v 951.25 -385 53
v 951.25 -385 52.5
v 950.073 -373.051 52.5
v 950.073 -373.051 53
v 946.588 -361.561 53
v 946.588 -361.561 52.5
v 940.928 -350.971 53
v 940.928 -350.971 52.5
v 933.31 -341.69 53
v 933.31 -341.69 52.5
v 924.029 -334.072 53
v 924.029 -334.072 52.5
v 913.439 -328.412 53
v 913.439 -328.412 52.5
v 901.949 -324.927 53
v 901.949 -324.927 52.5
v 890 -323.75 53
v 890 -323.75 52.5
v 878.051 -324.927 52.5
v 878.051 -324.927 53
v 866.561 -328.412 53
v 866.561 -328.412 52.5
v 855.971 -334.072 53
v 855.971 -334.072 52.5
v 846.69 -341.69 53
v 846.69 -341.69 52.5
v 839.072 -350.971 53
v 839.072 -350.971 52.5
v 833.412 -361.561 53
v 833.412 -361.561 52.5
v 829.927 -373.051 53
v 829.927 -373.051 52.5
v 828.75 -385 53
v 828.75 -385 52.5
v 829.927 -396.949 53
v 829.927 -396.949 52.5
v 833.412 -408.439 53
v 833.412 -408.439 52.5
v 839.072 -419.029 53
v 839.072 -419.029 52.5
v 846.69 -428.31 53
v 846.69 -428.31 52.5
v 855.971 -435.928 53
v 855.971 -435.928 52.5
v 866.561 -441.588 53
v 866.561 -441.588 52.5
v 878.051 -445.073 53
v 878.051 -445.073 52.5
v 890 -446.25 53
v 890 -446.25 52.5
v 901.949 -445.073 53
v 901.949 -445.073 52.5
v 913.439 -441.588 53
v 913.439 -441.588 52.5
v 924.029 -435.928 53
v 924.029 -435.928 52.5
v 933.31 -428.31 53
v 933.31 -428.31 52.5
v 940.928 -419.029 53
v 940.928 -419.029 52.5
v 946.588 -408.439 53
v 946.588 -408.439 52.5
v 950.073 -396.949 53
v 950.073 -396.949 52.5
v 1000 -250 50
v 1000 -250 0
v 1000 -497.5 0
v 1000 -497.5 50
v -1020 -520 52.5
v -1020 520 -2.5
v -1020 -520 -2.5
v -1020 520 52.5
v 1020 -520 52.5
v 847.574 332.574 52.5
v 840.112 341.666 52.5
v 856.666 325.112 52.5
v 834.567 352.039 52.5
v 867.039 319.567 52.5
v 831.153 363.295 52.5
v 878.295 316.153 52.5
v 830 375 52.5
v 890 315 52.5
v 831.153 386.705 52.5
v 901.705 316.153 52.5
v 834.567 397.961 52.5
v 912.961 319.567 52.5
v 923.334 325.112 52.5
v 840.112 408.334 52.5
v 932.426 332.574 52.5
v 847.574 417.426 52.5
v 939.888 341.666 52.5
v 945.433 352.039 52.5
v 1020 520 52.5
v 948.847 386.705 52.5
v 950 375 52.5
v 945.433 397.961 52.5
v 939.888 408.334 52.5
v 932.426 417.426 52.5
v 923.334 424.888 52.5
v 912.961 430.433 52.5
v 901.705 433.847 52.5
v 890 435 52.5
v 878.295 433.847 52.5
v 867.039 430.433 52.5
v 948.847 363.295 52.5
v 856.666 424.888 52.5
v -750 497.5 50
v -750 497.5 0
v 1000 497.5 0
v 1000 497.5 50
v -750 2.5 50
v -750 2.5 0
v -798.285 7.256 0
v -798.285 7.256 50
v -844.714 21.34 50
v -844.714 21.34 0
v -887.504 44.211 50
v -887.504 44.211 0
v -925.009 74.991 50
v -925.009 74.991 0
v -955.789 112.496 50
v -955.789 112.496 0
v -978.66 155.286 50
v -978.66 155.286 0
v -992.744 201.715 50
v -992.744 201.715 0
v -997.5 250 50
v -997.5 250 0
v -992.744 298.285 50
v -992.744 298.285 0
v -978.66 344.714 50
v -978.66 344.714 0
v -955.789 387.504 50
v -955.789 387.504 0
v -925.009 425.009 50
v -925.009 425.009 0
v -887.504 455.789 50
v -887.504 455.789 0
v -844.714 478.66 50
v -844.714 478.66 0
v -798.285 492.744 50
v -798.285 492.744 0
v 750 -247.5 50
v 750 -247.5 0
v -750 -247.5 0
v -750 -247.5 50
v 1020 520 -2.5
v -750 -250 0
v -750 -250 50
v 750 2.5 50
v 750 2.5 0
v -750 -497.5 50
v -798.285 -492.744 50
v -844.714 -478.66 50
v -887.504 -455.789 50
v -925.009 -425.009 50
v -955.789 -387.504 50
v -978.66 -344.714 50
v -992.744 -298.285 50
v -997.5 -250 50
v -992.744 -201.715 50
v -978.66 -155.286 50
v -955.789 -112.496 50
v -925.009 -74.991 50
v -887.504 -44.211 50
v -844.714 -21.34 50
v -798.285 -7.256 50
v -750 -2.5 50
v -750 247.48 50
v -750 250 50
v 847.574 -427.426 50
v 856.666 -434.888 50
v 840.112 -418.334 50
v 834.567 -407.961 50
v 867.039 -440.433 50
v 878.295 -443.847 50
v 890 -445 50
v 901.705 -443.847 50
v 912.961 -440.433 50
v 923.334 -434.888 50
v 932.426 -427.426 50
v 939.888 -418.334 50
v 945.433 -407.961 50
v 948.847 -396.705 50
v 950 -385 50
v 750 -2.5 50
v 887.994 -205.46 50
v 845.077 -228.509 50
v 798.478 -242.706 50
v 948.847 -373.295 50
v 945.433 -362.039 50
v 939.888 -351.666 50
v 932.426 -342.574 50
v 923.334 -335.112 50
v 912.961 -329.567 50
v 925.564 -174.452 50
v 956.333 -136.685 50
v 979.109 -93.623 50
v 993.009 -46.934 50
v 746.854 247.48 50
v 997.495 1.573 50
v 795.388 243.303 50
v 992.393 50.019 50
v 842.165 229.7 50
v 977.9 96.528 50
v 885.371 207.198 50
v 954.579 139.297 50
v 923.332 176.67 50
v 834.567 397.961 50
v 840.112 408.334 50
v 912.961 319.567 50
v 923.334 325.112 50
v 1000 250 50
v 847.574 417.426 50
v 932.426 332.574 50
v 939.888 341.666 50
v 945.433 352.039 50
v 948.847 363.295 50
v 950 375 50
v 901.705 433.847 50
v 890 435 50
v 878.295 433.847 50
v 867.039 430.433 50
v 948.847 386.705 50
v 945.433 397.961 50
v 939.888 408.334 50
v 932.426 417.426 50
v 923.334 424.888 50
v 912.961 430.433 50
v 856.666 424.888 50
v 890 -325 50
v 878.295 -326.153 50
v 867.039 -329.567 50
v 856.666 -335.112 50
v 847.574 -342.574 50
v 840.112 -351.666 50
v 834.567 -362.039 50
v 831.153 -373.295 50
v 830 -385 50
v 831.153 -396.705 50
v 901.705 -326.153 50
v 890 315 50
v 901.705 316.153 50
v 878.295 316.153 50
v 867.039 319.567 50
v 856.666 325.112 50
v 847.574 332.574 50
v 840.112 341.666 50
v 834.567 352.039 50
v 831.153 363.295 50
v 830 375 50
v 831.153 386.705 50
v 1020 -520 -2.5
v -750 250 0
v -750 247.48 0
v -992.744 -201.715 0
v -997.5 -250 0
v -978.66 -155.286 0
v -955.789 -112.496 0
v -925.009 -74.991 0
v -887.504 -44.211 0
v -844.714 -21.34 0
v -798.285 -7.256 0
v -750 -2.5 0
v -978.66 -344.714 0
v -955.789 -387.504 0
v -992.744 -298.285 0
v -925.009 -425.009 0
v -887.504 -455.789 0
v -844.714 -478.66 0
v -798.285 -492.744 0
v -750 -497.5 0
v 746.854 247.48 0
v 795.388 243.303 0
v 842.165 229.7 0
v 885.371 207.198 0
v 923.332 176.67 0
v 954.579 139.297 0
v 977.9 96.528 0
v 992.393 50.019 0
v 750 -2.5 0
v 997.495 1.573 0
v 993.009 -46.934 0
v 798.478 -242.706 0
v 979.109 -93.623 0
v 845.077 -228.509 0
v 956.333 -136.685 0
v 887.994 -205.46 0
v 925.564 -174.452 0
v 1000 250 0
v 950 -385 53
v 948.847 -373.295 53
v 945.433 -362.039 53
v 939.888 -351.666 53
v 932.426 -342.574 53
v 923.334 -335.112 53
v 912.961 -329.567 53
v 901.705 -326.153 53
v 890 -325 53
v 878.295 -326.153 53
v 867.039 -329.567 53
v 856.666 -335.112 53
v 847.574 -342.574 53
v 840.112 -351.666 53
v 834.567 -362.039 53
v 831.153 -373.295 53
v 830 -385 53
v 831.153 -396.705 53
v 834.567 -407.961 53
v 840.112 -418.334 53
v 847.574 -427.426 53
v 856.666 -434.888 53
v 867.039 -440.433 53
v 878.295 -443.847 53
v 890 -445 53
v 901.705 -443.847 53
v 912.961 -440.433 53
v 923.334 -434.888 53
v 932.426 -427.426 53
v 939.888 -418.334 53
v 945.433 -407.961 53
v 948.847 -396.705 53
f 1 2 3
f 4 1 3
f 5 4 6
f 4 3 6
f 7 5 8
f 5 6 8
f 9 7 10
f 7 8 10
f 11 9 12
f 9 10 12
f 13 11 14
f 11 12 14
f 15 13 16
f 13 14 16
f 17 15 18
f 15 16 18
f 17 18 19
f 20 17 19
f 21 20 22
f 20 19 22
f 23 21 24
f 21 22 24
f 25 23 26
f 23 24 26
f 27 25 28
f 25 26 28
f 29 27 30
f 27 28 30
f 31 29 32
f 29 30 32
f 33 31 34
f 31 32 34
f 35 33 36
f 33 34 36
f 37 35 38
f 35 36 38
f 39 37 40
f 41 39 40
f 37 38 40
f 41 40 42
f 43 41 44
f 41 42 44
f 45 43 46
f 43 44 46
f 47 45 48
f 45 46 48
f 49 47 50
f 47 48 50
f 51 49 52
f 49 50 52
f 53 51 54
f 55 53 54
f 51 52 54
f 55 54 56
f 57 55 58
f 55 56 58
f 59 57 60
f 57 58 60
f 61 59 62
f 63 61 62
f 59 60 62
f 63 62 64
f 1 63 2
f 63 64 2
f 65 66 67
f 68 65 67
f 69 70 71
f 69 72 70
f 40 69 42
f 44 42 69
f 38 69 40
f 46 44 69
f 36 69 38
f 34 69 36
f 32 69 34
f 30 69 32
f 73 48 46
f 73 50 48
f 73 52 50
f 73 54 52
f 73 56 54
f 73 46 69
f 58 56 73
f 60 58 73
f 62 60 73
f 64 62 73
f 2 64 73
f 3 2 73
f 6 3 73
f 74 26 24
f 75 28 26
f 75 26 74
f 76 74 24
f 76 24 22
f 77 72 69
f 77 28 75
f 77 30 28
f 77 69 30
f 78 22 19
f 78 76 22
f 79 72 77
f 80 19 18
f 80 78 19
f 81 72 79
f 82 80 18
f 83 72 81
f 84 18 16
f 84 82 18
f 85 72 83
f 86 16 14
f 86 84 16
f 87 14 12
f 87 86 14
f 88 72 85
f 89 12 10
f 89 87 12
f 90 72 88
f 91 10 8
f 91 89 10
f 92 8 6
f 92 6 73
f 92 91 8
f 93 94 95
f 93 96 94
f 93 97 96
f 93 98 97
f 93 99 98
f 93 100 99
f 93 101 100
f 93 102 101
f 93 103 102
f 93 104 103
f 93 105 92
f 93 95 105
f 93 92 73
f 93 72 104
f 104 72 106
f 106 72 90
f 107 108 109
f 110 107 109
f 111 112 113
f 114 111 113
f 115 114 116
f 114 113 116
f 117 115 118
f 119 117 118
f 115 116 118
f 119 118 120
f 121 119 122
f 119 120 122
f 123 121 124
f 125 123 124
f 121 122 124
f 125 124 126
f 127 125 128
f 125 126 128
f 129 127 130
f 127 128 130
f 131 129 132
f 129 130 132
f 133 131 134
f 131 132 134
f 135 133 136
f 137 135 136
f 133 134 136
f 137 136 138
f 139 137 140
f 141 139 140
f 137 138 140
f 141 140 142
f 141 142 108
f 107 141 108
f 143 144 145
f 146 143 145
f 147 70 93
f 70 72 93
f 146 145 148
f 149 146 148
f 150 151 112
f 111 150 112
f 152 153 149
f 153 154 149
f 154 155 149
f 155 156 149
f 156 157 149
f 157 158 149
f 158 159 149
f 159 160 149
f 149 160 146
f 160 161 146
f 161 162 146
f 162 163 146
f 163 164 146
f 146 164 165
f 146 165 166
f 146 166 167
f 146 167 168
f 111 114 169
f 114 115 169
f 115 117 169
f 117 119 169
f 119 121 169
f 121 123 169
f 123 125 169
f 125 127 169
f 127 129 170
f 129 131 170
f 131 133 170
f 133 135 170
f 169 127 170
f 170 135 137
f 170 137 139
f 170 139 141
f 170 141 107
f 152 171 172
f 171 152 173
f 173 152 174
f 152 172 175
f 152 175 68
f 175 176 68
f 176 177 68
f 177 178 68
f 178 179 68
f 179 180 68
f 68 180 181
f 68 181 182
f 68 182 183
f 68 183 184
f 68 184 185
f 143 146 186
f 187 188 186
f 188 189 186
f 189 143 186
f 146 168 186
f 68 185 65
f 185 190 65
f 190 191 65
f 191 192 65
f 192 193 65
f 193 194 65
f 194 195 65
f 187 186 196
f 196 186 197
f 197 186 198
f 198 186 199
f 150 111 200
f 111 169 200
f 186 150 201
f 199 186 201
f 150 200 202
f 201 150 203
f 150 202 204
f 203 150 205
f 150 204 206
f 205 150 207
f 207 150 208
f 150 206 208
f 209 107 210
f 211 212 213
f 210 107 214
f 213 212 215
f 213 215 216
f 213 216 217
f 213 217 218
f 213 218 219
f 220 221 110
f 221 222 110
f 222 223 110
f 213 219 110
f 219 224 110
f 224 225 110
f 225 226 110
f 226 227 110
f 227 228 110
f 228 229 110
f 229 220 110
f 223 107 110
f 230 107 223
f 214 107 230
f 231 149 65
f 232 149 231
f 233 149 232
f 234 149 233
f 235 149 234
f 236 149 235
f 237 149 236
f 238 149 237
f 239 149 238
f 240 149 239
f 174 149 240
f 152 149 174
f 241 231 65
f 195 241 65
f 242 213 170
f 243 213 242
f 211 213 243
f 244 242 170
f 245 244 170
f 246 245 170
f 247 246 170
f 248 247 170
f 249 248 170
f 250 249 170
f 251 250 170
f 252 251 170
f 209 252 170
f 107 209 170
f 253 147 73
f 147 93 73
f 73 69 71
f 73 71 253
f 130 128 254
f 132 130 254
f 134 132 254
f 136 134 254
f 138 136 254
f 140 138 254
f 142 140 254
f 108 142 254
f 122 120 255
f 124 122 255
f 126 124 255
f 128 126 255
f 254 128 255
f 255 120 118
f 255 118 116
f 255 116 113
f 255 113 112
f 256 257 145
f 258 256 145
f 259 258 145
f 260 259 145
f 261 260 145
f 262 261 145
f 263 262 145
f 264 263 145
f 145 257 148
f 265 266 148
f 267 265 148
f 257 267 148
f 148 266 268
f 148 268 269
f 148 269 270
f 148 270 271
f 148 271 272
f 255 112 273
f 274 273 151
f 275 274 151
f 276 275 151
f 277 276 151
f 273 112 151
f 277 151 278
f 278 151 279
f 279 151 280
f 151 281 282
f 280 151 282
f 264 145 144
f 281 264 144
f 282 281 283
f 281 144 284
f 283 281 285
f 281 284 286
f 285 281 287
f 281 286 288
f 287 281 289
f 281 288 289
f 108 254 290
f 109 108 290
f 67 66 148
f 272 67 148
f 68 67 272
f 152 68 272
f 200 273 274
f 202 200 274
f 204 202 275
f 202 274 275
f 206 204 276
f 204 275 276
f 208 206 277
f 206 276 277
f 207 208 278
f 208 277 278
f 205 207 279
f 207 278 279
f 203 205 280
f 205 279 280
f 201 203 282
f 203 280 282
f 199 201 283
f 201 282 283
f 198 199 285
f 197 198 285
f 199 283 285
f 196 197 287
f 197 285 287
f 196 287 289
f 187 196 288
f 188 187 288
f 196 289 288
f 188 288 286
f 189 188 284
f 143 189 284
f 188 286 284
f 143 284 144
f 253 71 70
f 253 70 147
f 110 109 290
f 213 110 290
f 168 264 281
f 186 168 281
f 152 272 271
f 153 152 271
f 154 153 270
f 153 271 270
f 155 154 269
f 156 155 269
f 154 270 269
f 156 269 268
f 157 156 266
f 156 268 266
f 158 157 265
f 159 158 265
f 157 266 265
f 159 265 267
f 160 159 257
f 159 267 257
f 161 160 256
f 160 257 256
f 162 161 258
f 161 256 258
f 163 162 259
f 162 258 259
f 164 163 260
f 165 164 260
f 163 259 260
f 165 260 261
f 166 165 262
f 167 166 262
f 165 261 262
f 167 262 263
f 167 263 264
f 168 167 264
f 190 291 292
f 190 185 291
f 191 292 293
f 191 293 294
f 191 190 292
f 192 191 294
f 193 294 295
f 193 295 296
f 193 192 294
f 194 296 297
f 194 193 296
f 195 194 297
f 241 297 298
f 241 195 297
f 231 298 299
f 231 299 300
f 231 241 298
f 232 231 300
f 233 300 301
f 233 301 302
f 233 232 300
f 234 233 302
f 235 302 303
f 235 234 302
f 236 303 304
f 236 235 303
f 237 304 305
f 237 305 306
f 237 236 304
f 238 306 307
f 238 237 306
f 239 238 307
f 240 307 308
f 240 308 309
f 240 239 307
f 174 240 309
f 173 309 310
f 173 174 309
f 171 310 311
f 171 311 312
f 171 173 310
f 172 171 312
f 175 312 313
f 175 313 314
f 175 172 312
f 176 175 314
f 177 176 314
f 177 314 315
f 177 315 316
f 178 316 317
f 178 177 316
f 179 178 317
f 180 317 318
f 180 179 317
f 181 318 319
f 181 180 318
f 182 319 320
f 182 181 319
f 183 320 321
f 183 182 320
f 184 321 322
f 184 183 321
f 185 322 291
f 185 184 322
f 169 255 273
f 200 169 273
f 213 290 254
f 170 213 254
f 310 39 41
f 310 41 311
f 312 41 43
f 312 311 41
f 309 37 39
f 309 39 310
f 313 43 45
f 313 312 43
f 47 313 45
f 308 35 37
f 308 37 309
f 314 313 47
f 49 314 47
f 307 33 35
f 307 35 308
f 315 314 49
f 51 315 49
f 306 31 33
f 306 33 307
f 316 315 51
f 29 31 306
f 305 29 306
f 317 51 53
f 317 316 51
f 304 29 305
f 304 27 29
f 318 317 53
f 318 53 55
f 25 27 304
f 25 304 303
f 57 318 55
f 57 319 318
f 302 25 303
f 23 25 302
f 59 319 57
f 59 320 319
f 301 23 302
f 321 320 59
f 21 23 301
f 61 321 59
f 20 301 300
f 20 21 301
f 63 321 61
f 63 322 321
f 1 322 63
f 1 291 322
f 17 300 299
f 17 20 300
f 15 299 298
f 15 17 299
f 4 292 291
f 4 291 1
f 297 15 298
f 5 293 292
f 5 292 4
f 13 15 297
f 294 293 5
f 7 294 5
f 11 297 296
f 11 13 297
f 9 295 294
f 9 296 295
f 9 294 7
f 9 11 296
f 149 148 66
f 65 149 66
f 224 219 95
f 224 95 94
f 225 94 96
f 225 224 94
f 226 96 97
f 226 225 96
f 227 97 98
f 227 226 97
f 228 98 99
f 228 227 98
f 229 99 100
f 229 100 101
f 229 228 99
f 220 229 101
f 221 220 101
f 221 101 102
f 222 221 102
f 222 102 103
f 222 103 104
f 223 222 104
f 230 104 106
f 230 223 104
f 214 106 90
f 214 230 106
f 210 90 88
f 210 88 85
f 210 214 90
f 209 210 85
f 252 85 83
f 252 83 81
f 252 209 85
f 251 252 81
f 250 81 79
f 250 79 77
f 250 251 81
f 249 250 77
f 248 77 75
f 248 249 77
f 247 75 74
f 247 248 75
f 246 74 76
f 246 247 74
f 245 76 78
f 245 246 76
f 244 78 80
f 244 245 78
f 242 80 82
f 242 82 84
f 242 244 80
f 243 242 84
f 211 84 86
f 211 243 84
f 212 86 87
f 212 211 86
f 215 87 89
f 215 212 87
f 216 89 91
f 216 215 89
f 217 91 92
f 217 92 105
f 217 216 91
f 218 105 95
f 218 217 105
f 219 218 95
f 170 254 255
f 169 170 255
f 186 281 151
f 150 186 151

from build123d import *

# Parameters (mm, degrees)
F0_W     = 2040
F0_H     = 1040
F1_DEPTH = 50
F2_W     = 2040
F2_H     = 1040
F2_R     = 60
F3_DEPTH = 2.5
F4_W     = 2040
F4_H     = 1040
F5_DEPTH = 2.5
F6_R     = 61.25
F6_R_2   = 60
F7_DEPTH = 0.5


with BuildPart() as f1:
    # F0 (on Top) → F1 (new body)
    with BuildSketch(Plane.XY):
        Rectangle(F0_W, F0_H)
        Polygon((-1000, 250), (-1000, 500), (-750, 500), (1000, 500), (1000, 497.5), (1000, 250), (1000, -2.028e-07), (1000, -250), (1000, -497.5), (1000, -500), (-750, -500), (-1000, -500), (-1000, -250.0000003493), align=None, mode=Mode.SUBTRACT)
        with BuildLine():
            ThreePointArc((-750, -500), (-926.7766951731, -426.7766954201), (-1000, -250.0000003493))
            Line((-1000, -250.0000003493), (-1000, -500))
            Line((-1000, -500), (-750, -500))
        make_face()
        with BuildLine():
            ThreePointArc((-750, 0), (-926.7766952966, 73.2233047034), (-1000, 250))
            Line((-1000, 250), (-1000, -250.0000003493))
            ThreePointArc((-1000, -250.0000003493), (-926.7766954201, -73.2233048269), (-750, 0))
        make_face()
        with BuildLine():
            Line((-750, 500), (-1000, 500))
            Line((-1000, 500), (-1000, 250))
            ThreePointArc((-1000, 250), (-926.7766952966, 426.7766952966), (-750, 500))
        make_face()
        with BuildLine():
            Line((1000, -2.028e-07), (1000, 250))
            Line((1000, 250), (750, 250))
            ThreePointArc((750, 250), (926.7766953683, 176.7766952249), (1000, -2.028e-07))
        make_face()
        with BuildLine():
            Line((1000, -250), (1000, -2.028e-07))
            ThreePointArc((1000, -2.028e-07), (926.7766952249, -176.7766953683), (750, -250))
            Line((750, -250), (1000, -250))
        make_face()
        with BuildLine():
            ThreePointArc((750, -250), (926.7766952249, -176.7766953683), (1000, -2.028e-07))
            ThreePointArc((1000, -2.028e-07), (926.7766953683, 176.7766952249), (750, 250))
            Line((750, 250), (-750, 250))
            Line((-750, 250), (-750, 247.48))
            Line((-750, 247.48), (746.8536370203, 247.48))
            ThreePointArc((746.8536370203, 247.48), (997.4949999495, 1.5732132723), (750, -247.5))
            Line((750, -247.5), (-750, -247.5))
            Line((-750, -247.5), (-750, -250))
            Line((-750, -250), (750, -250))
        make_face()
        with BuildLine():
            Line((1000, 500), (-750, 500))
            ThreePointArc((-750, 500), (-926.7766952966, 426.7766952966), (-1000, 250))
            ThreePointArc((-1000, 250), (-926.7766952966, 73.2233047034), (-750, 0))
            ThreePointArc((-750, 0), (-926.7766954201, -73.2233048269), (-1000, -250.0000003493))
            ThreePointArc((-1000, -250.0000003493), (-926.7766951731, -426.7766954201), (-750, -500))
            Line((-750, -500), (1000, -500))
            Line((1000, -500), (1000, -497.5))
            Line((1000, -497.5), (-750, -497.5))
            ThreePointArc((-750, -497.5), (-997.5, -250), (-750, -2.5))
            Line((-750, -2.5), (750, -2.5))
            Line((750, -2.5), (750, 2.5))
            Line((750, 2.5), (-750, 2.5))
            ThreePointArc((-750, 2.5), (-997.5, 250), (-750, 497.5))
            Line((-750, 497.5), (1000, 497.5))
            Line((1000, 497.5), (1000, 500))
        make_face()
    extrude(amount=F1_DEPTH)

    # F2 (on face) → F3 (join)
    with BuildSketch(Plane.XY.offset(50)):
        Rectangle(F2_W, F2_H)
        with Locations((890, -385)):
            Circle(F2_R, mode=Mode.SUBTRACT)
        with Locations((890, 375)):
            Circle(F2_R, mode=Mode.SUBTRACT)
    extrude(amount=F3_DEPTH)

    # F4 (on face) → F5 (join)
    with BuildSketch(Plane(origin=(0, 0, 0), x_dir=(1, 0, 0), z_dir=(0, 0, -1))):
        Rectangle(F4_W, F4_H)
    extrude(amount=F5_DEPTH)

    # F6 (on face) → F7 (join)
    with BuildSketch(Plane.XY.offset(52.5)):
        with Locations((890, -385)):
            Circle(F6_R)
        with Locations((890, -385)):
            Circle(F6_R_2, mode=Mode.SUBTRACT)
    extrude(amount=F7_DEPTH)


solid = f1.part
